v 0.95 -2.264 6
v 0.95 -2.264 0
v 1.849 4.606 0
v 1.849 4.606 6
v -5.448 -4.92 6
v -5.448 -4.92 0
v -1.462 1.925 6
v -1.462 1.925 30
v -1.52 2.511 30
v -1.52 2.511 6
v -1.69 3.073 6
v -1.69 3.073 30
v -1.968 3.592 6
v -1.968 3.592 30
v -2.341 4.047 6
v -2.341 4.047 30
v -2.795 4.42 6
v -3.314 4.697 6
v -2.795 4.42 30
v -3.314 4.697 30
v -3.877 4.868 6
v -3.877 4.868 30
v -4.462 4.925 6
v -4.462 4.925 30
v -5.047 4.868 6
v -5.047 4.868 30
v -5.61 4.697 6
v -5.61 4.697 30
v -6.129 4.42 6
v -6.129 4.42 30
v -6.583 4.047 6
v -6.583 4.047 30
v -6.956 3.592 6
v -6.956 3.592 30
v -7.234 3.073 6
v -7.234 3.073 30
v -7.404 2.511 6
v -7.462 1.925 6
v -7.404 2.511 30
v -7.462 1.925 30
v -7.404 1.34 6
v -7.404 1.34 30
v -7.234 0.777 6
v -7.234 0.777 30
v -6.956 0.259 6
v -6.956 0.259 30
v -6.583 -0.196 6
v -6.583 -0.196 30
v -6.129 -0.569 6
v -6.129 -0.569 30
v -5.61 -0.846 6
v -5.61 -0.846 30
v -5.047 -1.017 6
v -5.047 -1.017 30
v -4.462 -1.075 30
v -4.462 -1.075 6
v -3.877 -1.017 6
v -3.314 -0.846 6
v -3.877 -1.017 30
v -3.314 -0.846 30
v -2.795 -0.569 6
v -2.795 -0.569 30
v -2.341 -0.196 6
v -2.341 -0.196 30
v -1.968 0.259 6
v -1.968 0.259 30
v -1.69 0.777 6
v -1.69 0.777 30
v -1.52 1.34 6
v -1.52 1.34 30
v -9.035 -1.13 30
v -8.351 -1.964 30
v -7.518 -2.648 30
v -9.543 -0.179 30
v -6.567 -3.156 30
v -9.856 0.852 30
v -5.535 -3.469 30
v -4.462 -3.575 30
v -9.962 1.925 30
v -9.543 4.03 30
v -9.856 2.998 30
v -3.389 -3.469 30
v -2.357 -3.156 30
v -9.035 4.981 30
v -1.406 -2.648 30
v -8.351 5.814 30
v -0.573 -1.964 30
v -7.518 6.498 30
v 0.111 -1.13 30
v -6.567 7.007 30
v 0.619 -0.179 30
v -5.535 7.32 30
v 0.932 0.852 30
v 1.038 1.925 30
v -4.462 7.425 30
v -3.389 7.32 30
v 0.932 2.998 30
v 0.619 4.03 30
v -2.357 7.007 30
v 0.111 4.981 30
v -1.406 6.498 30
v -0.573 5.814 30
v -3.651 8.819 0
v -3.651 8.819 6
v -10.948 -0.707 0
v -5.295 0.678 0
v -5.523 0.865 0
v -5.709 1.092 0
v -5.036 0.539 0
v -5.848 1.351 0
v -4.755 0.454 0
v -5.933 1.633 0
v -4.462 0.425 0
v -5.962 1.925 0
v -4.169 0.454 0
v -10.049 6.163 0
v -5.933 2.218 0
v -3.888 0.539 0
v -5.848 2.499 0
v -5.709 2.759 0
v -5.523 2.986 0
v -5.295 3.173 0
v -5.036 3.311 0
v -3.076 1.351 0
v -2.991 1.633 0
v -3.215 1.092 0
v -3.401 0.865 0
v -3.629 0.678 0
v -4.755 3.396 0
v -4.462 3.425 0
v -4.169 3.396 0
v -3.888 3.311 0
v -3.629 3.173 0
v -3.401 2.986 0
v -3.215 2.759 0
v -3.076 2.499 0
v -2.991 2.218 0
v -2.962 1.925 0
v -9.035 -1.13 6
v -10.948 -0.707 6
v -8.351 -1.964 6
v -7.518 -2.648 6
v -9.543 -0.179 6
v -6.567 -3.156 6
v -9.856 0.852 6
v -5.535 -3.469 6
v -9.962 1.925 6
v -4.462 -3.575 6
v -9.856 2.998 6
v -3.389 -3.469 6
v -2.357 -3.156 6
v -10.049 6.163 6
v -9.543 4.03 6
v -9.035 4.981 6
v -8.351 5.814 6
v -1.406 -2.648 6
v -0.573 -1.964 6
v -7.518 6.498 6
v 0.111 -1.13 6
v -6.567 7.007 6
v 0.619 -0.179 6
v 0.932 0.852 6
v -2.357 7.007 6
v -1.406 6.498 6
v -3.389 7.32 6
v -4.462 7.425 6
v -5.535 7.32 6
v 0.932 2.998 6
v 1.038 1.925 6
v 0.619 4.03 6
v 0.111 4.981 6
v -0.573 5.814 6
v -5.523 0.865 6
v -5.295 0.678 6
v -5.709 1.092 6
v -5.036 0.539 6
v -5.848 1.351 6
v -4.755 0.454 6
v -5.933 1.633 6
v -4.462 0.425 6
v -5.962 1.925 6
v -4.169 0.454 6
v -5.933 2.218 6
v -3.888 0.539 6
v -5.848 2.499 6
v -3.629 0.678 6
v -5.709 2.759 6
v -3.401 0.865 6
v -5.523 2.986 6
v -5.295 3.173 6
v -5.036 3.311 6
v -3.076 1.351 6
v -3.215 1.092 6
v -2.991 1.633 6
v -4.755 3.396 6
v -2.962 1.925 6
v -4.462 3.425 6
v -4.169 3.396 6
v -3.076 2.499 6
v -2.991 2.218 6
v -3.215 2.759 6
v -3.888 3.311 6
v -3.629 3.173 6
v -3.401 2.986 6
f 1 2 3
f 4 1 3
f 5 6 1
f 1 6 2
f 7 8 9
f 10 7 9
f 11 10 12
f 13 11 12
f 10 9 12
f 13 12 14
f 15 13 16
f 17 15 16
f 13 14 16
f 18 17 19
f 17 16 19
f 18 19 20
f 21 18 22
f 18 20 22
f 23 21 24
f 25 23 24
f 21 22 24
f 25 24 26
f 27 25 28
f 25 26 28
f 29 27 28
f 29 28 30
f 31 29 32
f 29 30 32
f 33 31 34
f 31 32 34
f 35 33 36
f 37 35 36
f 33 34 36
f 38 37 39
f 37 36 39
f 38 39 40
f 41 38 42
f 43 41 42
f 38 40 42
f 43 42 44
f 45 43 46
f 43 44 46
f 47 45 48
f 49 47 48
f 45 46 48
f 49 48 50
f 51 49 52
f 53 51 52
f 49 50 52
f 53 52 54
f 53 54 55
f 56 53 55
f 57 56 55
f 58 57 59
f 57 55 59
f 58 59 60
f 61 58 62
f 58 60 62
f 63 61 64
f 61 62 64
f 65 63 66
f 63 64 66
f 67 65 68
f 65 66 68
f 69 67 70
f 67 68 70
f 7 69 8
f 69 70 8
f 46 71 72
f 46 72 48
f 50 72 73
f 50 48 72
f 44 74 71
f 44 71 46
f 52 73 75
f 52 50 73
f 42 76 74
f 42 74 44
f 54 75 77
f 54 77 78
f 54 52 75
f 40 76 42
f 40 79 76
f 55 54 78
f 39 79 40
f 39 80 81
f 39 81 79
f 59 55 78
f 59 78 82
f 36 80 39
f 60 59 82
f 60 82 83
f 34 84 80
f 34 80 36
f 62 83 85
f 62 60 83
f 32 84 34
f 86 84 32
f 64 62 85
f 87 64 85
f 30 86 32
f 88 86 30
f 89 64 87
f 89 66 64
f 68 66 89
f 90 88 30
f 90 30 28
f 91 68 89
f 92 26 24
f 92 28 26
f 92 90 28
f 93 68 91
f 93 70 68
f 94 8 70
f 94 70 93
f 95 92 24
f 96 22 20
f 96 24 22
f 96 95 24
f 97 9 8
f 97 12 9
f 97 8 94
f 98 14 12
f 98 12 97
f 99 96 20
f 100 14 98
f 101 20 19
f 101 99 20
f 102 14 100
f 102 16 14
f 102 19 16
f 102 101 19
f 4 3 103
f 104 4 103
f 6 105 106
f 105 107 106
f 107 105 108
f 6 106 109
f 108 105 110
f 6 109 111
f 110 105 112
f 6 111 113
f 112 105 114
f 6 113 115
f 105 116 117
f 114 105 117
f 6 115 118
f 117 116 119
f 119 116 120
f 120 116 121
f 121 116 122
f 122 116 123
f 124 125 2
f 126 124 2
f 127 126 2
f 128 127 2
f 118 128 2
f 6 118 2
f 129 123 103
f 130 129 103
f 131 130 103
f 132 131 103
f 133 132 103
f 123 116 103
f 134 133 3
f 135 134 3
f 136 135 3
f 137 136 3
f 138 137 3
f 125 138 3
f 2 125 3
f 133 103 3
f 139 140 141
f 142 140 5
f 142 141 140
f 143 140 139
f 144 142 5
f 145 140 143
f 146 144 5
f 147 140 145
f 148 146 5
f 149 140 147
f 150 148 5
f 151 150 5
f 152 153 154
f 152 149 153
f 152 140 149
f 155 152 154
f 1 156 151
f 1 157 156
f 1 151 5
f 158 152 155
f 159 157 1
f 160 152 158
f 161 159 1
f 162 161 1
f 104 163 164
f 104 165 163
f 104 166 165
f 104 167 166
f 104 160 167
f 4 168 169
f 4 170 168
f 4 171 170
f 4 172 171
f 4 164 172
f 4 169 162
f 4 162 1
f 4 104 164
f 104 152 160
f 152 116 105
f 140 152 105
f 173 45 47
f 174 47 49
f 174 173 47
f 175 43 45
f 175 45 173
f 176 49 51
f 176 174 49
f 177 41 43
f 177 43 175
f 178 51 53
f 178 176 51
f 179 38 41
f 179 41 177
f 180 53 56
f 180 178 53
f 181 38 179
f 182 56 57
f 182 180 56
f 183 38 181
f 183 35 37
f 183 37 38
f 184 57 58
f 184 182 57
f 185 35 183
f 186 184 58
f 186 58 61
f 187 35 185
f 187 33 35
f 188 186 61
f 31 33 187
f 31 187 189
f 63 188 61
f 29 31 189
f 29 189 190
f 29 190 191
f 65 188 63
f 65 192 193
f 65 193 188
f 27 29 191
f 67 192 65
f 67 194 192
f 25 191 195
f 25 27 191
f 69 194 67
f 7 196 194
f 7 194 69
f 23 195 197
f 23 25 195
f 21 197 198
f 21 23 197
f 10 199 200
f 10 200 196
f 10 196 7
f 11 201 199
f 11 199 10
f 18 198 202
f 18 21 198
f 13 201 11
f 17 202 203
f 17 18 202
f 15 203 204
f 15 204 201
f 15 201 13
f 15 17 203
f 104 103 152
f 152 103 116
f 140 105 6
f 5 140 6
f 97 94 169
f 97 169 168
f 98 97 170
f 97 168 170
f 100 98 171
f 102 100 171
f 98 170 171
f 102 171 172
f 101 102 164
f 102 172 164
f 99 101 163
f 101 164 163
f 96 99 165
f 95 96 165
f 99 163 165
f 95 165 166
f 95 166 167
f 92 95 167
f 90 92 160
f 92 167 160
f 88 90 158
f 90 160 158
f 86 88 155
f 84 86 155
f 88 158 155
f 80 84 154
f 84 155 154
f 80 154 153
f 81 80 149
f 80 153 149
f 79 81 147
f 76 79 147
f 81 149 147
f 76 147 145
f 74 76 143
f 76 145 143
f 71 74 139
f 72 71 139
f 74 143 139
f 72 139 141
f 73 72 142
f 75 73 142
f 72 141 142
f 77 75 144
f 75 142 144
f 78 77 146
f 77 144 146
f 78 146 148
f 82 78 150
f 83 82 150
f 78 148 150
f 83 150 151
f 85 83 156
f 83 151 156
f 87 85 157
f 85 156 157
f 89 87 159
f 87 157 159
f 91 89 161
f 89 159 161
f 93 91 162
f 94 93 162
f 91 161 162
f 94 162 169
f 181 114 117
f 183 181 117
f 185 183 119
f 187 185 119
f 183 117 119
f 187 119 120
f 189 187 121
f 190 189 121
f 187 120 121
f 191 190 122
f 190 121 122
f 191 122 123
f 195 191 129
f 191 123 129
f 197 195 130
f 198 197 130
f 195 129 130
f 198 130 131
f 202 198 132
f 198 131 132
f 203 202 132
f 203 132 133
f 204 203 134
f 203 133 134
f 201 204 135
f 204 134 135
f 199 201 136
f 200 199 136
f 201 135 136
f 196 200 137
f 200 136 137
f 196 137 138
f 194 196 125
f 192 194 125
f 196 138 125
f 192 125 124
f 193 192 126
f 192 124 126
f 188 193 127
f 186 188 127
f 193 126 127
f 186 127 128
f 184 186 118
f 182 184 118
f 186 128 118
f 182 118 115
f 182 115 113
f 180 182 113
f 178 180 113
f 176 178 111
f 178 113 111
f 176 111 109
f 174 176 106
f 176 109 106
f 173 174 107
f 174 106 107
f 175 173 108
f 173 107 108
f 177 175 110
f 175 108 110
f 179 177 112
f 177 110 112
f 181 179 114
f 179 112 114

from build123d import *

# Parameters (mm, degrees)
BOSS_EXTRUDE1_DEPTH = 6
SKETCH3_R           = 5.5
BOSS_EXTRUDE2_DEPTH = 24
SKETCH4_R           = 1.5
CUT_EXTRUDE1_DEPTH  = 6
SKETCH5_R           = 3
CUT_EXTRUDE2_DEPTH  = 24


with BuildPart() as part:
    # Sketch1 → Boss-Extrude1 (new body)
    with BuildSketch(Plane.XY):
        Polygon((0.950381036, -2.263552428), (1.849306406, 4.606086076), (-3.650512368, 8.819397535), (-10.049256513, 6.163070489), (-10.948181883, -0.706568015), (-5.448363108, -4.919879474), align=None)
    extrude(amount=BOSS_EXTRUDE1_DEPTH)

    # Sketch3 → Boss-Extrude2 (add)
    with BuildSketch(Plane.XY.offset(6)):
        with Locations((-4.462077205, 1.925315909)):
            Circle(SKETCH3_R)
    extrude(amount=BOSS_EXTRUDE2_DEPTH)

    # Sketch4 → Cut-Extrude1 (cut)
    with BuildSketch(Plane(origin=(0, 0, 0), x_dir=(-1, 0, 0), z_dir=(0, 0, -1))):
        with Locations((4.462077205, 1.925315909)):
            Circle(SKETCH4_R)
    extrude(amount=-CUT_EXTRUDE1_DEPTH, mode=Mode.SUBTRACT)

    # Sketch5 → Cut-Extrude2 (cut)
    with BuildSketch(Plane.XY.offset(30)):
        with Locations((-4.462077205, 1.925315909)):
            Circle(SKETCH5_R)
    extrude(amount=-CUT_EXTRUDE2_DEPTH, mode=Mode.SUBTRACT)


solid = part.part
